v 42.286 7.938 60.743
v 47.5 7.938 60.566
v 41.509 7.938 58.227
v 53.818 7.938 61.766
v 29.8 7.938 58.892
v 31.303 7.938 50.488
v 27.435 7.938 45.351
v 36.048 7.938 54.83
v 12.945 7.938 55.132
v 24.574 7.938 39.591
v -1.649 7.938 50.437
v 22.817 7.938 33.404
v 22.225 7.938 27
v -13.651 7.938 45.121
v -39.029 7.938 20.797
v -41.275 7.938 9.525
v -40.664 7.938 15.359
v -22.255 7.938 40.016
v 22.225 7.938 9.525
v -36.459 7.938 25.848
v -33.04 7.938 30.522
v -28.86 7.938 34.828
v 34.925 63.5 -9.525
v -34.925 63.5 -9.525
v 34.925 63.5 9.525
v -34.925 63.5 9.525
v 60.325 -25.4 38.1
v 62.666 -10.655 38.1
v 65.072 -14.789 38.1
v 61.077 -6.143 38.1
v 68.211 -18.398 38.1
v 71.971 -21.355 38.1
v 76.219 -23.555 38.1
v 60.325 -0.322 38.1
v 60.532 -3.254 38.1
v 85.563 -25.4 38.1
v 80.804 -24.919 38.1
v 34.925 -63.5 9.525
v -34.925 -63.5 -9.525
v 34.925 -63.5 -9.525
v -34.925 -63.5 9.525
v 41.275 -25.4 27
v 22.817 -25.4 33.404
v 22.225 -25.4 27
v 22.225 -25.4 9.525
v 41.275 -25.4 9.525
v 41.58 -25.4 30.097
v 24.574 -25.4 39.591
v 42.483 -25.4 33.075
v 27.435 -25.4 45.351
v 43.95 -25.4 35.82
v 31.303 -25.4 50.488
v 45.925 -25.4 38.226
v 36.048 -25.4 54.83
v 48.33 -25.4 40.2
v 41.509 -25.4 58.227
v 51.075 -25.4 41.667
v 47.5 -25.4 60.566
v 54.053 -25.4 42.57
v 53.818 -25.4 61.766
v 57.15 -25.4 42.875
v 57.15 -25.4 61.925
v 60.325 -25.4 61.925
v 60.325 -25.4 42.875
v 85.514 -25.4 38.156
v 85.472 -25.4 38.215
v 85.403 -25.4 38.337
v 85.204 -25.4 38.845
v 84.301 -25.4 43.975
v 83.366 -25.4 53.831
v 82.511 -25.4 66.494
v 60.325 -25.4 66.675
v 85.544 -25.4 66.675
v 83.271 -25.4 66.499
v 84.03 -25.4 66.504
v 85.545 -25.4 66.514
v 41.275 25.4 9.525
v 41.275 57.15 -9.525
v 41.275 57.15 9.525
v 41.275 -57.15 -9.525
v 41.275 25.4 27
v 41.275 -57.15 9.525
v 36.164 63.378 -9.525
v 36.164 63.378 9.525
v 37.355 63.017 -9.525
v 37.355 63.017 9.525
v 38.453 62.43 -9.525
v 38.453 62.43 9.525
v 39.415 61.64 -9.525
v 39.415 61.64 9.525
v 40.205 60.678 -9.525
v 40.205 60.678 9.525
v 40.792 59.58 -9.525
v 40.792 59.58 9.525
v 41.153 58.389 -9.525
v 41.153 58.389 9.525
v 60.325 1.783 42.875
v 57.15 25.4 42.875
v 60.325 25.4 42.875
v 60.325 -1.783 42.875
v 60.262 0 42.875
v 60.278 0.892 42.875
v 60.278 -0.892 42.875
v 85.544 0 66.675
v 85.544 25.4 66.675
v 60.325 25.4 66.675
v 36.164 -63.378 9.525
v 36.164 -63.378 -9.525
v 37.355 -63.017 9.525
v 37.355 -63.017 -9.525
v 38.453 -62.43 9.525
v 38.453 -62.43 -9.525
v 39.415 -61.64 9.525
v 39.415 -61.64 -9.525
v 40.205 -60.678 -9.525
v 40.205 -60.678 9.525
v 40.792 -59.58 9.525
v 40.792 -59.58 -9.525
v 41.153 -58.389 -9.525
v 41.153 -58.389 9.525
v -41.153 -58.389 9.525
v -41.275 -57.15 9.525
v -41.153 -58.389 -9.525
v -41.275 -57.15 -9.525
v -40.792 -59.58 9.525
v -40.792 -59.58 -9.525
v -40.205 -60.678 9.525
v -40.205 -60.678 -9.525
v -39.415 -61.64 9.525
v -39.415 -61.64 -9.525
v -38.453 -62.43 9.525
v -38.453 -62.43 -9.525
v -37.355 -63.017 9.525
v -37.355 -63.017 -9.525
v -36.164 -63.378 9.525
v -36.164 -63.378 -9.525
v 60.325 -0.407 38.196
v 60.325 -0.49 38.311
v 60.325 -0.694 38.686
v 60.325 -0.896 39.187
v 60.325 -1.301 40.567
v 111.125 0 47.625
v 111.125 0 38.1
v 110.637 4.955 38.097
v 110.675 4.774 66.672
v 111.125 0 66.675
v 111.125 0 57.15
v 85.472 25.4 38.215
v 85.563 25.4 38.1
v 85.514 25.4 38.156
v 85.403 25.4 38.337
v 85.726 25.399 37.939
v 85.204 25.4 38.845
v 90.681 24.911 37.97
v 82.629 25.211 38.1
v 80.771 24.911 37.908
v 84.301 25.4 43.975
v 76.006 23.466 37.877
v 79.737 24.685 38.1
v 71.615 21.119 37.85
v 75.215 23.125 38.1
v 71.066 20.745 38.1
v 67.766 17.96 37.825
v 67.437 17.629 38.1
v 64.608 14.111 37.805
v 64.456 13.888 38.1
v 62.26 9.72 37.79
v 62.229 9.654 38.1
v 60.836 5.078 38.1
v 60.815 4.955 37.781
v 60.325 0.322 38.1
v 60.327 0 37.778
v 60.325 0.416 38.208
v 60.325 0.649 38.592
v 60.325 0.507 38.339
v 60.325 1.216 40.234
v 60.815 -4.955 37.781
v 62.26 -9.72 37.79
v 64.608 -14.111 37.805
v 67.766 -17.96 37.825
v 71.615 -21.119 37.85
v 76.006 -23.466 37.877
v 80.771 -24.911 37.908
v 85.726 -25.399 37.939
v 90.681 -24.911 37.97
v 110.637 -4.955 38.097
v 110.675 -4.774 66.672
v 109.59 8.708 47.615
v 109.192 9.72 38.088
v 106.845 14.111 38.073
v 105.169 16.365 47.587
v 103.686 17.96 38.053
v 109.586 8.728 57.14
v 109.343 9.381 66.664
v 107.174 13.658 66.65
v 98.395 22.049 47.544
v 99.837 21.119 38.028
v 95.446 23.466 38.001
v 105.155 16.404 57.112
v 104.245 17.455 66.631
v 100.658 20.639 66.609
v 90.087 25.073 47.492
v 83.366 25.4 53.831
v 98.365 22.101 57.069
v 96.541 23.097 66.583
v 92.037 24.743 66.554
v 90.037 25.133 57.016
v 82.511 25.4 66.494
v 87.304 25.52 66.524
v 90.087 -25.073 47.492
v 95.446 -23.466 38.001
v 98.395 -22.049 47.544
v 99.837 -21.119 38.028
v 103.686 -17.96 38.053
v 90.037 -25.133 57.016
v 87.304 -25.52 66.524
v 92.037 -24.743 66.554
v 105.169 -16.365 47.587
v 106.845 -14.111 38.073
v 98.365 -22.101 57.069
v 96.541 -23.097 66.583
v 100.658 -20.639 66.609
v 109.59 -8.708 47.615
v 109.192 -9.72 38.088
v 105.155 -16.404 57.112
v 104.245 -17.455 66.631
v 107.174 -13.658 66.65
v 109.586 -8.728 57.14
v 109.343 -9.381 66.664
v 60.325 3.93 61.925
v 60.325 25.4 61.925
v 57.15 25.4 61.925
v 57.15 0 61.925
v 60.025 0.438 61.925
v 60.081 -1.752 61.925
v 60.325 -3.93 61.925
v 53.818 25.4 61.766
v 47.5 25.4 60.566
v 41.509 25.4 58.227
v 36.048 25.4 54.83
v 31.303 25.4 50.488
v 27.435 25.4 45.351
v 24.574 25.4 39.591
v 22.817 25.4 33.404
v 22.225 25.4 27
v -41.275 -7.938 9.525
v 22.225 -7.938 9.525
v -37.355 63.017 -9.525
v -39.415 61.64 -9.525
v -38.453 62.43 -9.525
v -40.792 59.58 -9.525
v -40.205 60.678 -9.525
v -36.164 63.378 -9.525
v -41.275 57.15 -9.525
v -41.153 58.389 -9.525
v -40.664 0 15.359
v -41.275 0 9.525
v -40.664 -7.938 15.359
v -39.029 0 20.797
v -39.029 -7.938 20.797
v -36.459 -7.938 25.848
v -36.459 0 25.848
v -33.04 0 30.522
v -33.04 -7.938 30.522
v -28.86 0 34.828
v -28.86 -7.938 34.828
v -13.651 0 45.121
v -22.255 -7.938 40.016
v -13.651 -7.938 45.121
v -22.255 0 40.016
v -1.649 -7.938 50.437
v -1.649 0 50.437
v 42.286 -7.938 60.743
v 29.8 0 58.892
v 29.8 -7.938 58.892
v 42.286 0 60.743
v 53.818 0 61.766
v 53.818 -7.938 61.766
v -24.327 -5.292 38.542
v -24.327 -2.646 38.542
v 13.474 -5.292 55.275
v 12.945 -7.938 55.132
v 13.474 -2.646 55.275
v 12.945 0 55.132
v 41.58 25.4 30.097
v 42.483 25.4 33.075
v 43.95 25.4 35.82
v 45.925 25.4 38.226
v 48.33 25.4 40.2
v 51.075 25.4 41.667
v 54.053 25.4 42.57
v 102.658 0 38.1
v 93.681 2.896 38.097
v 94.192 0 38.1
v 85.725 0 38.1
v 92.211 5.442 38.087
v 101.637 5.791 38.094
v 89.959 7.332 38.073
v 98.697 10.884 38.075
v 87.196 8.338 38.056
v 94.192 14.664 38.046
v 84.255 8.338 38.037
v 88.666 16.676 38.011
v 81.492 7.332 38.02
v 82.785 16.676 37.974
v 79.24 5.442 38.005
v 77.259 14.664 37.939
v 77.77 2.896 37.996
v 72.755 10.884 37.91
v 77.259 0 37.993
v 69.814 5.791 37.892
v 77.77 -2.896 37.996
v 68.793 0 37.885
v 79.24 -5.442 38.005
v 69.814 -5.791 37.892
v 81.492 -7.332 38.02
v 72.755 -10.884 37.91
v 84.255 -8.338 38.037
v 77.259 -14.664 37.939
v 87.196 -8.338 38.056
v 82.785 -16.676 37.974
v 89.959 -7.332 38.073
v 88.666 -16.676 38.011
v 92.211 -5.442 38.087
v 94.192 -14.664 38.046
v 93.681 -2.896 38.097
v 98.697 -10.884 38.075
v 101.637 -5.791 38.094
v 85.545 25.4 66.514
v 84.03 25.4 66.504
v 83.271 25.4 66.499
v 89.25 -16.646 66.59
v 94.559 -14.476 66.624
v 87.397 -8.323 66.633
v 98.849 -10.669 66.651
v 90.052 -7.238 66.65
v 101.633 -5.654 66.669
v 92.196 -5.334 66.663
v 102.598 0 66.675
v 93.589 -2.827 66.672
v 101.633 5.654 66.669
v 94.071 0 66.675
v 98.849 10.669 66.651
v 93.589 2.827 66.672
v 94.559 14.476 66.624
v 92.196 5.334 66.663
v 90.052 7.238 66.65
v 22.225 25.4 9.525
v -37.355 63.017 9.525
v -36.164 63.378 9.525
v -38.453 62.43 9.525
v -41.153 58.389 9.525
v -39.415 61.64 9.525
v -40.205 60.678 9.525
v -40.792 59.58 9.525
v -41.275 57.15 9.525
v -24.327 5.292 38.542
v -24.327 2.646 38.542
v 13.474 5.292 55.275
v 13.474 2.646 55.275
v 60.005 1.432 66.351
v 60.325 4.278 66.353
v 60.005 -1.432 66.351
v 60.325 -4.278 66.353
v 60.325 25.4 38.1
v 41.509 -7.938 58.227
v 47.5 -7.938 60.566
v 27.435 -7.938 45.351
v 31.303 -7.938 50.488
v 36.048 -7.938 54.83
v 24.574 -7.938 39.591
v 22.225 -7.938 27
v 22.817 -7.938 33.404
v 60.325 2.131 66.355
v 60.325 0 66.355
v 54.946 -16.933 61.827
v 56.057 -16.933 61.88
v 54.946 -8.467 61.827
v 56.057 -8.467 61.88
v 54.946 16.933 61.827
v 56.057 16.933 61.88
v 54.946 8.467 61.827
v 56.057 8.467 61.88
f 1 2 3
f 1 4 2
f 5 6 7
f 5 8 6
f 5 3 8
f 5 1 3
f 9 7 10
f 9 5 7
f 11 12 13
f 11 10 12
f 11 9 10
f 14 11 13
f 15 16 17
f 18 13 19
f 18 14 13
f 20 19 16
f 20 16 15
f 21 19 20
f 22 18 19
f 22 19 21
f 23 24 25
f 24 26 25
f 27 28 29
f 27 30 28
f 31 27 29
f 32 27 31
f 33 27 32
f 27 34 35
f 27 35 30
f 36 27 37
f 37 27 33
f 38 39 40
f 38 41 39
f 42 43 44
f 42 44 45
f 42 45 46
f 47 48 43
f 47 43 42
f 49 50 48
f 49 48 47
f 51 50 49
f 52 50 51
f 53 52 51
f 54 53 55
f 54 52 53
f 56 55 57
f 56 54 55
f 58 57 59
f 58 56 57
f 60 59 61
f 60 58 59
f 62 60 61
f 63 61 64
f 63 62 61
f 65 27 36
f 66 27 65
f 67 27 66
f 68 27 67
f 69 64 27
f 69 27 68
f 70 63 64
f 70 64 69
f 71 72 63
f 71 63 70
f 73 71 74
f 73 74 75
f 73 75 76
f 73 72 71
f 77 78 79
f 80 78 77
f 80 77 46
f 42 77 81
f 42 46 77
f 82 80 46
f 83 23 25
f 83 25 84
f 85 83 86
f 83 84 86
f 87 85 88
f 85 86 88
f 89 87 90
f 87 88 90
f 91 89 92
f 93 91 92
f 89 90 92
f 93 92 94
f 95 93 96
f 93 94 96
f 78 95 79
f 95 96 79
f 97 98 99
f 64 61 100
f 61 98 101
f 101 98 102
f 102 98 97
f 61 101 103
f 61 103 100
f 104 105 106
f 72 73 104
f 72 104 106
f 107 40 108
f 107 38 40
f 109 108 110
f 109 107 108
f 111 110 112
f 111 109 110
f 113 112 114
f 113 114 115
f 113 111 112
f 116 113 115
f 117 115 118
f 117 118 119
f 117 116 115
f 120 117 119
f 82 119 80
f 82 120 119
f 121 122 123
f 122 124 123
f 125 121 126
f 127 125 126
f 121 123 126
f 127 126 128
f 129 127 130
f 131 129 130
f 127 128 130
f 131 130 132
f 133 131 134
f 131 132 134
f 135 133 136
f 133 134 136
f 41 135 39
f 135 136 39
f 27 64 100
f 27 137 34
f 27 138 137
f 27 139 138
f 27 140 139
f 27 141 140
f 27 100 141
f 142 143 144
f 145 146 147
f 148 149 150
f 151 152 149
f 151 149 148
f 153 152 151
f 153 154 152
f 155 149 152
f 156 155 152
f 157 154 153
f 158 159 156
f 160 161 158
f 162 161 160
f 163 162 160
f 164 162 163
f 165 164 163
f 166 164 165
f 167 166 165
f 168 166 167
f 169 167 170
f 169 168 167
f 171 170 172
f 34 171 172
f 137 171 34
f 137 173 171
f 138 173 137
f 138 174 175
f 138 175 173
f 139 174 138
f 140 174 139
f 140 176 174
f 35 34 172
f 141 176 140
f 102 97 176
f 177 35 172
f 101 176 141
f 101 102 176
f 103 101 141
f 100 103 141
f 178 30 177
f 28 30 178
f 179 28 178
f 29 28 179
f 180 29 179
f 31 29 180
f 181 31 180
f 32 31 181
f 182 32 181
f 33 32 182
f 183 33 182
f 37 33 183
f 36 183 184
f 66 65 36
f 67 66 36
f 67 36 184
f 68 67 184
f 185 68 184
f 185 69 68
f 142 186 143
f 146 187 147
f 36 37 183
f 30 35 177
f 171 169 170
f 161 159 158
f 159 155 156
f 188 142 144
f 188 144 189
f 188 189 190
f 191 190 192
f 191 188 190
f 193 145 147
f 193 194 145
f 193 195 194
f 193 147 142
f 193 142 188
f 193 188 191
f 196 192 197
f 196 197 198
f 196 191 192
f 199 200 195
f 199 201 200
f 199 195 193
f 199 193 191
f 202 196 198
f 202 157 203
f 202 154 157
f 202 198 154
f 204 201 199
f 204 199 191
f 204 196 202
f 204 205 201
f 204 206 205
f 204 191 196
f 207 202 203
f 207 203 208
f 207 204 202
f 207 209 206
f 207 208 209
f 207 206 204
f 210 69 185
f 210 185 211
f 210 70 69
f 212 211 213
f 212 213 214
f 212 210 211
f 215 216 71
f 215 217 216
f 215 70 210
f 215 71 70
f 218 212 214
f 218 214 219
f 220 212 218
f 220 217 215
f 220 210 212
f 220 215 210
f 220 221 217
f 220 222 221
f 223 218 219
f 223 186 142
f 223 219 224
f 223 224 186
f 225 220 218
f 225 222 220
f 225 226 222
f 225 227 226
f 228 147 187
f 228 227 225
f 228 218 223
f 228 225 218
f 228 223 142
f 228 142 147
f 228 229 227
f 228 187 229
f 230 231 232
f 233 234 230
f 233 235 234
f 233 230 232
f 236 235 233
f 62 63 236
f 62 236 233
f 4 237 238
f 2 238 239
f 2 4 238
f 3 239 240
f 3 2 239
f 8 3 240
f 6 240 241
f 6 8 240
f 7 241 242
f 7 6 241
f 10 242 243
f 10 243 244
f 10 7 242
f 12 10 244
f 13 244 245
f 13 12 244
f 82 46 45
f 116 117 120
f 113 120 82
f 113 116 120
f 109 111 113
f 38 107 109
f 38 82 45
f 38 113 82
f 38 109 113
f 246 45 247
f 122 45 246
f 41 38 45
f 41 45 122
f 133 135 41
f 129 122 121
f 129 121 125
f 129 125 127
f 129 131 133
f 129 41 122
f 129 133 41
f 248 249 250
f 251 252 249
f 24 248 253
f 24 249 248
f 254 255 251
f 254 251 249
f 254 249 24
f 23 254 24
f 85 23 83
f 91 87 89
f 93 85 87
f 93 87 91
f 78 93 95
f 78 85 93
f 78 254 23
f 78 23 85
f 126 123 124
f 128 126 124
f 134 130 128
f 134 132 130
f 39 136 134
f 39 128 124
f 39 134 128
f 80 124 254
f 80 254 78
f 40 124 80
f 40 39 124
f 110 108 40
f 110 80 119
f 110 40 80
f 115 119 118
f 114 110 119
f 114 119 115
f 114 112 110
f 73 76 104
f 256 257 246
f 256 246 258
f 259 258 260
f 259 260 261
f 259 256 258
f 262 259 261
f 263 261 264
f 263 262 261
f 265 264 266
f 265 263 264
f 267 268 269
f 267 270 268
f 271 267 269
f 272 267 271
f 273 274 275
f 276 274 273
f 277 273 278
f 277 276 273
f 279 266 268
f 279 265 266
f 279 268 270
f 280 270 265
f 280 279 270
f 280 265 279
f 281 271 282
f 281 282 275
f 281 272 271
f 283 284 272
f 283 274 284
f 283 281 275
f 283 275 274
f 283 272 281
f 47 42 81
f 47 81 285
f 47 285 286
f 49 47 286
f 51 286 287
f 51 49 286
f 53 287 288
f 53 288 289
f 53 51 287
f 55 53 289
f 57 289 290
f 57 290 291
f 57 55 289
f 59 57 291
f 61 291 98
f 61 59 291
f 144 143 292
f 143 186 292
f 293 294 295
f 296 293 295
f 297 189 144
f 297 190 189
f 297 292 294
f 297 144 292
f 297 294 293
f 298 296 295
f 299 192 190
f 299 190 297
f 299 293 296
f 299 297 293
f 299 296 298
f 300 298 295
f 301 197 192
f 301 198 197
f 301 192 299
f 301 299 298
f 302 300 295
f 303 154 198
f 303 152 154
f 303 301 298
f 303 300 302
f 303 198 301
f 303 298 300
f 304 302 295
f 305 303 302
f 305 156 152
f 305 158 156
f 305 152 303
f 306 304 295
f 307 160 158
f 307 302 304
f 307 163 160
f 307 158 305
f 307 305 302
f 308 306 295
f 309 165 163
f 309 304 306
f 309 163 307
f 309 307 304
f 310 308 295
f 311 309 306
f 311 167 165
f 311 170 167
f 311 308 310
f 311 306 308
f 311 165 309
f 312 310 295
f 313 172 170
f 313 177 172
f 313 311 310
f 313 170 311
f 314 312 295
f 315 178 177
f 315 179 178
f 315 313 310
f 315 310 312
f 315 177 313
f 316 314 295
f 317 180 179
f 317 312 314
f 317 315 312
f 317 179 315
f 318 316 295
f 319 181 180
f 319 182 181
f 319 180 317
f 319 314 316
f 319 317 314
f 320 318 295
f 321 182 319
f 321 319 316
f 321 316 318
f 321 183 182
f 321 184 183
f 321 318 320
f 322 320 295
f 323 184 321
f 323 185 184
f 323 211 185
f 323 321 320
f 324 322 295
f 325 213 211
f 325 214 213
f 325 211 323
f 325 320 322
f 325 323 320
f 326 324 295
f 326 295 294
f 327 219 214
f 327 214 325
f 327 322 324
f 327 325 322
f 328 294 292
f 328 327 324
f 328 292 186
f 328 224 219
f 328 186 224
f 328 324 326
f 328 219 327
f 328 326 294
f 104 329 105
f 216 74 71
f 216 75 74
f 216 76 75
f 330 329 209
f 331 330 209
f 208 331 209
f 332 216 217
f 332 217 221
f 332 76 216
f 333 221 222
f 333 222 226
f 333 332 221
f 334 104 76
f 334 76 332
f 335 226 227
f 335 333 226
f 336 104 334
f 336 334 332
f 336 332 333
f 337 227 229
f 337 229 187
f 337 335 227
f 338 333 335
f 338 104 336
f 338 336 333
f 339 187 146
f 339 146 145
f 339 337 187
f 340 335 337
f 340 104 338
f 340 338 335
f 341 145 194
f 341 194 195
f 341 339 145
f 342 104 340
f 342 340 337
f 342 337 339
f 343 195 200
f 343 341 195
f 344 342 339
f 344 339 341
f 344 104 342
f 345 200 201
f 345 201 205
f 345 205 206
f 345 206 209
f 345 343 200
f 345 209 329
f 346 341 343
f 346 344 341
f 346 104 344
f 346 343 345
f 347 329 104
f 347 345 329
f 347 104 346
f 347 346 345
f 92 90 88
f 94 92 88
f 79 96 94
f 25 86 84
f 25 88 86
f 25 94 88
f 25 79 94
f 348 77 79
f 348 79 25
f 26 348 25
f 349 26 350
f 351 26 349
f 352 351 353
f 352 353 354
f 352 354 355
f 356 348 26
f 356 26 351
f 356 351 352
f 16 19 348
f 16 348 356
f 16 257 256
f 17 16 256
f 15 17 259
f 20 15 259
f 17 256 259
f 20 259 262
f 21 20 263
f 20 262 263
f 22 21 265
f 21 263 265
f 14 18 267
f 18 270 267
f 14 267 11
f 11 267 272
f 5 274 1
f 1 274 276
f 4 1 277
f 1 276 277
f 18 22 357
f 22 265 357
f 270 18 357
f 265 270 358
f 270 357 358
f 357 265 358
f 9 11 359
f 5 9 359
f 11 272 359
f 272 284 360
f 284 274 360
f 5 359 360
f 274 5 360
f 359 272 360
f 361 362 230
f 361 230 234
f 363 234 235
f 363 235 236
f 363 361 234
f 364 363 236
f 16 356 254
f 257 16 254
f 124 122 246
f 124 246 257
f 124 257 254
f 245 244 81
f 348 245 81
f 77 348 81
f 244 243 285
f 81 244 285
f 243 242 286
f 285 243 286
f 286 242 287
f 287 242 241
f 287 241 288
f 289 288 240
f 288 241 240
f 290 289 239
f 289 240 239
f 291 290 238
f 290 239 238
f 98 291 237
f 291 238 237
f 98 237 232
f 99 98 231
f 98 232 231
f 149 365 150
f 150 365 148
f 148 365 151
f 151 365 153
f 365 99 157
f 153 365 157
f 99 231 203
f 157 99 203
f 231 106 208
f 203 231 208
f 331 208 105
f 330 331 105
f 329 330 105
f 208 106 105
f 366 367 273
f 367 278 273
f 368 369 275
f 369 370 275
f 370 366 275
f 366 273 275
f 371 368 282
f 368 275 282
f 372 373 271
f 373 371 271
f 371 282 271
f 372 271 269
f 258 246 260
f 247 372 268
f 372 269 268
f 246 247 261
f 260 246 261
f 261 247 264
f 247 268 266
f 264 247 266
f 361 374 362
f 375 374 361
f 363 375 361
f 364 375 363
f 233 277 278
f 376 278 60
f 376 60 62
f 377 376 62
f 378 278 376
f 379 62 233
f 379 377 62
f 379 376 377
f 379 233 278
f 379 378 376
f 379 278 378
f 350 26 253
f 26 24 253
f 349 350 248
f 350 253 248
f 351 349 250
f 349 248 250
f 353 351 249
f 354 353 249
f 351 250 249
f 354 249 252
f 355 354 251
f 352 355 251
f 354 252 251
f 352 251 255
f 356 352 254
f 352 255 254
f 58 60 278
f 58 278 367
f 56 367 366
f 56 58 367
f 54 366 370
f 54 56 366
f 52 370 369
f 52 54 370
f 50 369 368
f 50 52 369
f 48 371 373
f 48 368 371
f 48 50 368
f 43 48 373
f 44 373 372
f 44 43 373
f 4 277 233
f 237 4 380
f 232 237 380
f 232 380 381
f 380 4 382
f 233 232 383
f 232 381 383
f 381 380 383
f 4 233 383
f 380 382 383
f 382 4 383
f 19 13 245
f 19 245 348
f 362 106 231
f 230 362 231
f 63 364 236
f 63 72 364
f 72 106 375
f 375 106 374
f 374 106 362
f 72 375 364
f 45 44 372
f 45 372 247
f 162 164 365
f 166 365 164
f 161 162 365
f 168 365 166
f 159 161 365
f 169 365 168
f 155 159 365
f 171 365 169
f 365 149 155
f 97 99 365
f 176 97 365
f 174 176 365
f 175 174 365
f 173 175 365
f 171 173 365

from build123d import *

# Parameters (mm, degrees)
F1_DEPTH = 63.5
F2_DEPTH = 25.4
F3_DEPTH = 7.9375
F5_R     = 6.35


with BuildPart() as f1:
    # F0 (on Front) → F1 (new body, symmetric)
    with BuildSketch(Plane.XZ):
        Polygon((-41.275, -9.525), (41.275, -9.525), (41.275, 9.525), (22.225, 9.525), (-41.275, 9.525), align=None)
    extrude(amount=F1_DEPTH, both=True)

    # F0 (on Front) → F2 (join, symmetric)
    with BuildSketch(Plane.XZ):
        with BuildLine():
            Line((22.225, 9.525), (41.275, 9.525))
            Line((41.275, 9.525), (41.275, 27.0002))
            ThreePointArc((41.275, 27.0002), (45.9246798487, 38.2255201513), (57.15, 42.8752))
            Line((57.15, 42.8752), (60.325, 42.8752))
            Line((60.325, 42.8752), (60.325, 61.9252))
            Line((60.325, 61.9252), (57.15, 61.9252))
            add(Edge.make_bspline(
                [(53.8183914721, 61.765930391), (54.9540123477, 61.8314994044), (56.0654467047, 61.8844891287), (57.15, 61.9252)],
                knots=[108.0492715446, 108.0492715446, 108.0492715446, 108.0492715446, 111.5045361635, 111.5045361635, 111.5045361635, 111.5045361635], degree=3))
            ThreePointArc((53.8183914721, 61.765930391), (31.3032201925, 50.4884864122), (22.225, 27.0002))
            Line((22.225, 27.0002), (22.225, 9.525))
        make_face()
        Polygon((60.325, 61.9252), (60.325, 42.8752), (60.325, 38.1), (85.725, 38.1), (85.5438719422, 66.675), (60.325, 66.675), align=None)
    extrude(amount=F2_DEPTH, both=True)

    # F0 (on Front) → F3 (join, symmetric)
    with BuildSketch(Plane.XZ):
        with BuildLine():
            add(Edge.make_bspline(
                [(-41.275, 9.525), (-40.856674268, 45.3642172034), (18.3064924153, 59.7155276242), (53.8183914721, 61.765930391)],
                knots=[0, 0, 0, 0, 108.0492715446, 108.0492715446, 108.0492715446, 108.0492715446], degree=3))
            Line((-41.275, 9.525), (22.225, 9.525))
            Line((22.225, 9.525), (22.225, 27.0002))
            ThreePointArc((22.225, 27.0002), (31.3032201925, 50.4884864122), (53.8183914721, 61.765930391))
        make_face()
    extrude(amount=F3_DEPTH, both=True)

    # F0 (on Front) → F4 (revolve)
    with BuildSketch(Plane.XZ):
        Polygon((85.5438719422, 66.675), (85.725, 38.1), (111.125, 38.1), (111.125, 66.675), align=None)
    revolve(axis=Axis((85.6344359711, 0, 52.3875), (-0.0063385623, 0, 0.9999799111)))

    # F5
    f5_edges = [f1.edges().sort_by_distance(p)[0] for p in [
        (41.275, -63.5, 0),
        (-41.275, -63.5, 0),
        (-41.275, 63.5, 0),
        (41.275, 63.5, 0),
    ]]
    fillet(f5_edges, radius=F5_R)


solid = f1.part
